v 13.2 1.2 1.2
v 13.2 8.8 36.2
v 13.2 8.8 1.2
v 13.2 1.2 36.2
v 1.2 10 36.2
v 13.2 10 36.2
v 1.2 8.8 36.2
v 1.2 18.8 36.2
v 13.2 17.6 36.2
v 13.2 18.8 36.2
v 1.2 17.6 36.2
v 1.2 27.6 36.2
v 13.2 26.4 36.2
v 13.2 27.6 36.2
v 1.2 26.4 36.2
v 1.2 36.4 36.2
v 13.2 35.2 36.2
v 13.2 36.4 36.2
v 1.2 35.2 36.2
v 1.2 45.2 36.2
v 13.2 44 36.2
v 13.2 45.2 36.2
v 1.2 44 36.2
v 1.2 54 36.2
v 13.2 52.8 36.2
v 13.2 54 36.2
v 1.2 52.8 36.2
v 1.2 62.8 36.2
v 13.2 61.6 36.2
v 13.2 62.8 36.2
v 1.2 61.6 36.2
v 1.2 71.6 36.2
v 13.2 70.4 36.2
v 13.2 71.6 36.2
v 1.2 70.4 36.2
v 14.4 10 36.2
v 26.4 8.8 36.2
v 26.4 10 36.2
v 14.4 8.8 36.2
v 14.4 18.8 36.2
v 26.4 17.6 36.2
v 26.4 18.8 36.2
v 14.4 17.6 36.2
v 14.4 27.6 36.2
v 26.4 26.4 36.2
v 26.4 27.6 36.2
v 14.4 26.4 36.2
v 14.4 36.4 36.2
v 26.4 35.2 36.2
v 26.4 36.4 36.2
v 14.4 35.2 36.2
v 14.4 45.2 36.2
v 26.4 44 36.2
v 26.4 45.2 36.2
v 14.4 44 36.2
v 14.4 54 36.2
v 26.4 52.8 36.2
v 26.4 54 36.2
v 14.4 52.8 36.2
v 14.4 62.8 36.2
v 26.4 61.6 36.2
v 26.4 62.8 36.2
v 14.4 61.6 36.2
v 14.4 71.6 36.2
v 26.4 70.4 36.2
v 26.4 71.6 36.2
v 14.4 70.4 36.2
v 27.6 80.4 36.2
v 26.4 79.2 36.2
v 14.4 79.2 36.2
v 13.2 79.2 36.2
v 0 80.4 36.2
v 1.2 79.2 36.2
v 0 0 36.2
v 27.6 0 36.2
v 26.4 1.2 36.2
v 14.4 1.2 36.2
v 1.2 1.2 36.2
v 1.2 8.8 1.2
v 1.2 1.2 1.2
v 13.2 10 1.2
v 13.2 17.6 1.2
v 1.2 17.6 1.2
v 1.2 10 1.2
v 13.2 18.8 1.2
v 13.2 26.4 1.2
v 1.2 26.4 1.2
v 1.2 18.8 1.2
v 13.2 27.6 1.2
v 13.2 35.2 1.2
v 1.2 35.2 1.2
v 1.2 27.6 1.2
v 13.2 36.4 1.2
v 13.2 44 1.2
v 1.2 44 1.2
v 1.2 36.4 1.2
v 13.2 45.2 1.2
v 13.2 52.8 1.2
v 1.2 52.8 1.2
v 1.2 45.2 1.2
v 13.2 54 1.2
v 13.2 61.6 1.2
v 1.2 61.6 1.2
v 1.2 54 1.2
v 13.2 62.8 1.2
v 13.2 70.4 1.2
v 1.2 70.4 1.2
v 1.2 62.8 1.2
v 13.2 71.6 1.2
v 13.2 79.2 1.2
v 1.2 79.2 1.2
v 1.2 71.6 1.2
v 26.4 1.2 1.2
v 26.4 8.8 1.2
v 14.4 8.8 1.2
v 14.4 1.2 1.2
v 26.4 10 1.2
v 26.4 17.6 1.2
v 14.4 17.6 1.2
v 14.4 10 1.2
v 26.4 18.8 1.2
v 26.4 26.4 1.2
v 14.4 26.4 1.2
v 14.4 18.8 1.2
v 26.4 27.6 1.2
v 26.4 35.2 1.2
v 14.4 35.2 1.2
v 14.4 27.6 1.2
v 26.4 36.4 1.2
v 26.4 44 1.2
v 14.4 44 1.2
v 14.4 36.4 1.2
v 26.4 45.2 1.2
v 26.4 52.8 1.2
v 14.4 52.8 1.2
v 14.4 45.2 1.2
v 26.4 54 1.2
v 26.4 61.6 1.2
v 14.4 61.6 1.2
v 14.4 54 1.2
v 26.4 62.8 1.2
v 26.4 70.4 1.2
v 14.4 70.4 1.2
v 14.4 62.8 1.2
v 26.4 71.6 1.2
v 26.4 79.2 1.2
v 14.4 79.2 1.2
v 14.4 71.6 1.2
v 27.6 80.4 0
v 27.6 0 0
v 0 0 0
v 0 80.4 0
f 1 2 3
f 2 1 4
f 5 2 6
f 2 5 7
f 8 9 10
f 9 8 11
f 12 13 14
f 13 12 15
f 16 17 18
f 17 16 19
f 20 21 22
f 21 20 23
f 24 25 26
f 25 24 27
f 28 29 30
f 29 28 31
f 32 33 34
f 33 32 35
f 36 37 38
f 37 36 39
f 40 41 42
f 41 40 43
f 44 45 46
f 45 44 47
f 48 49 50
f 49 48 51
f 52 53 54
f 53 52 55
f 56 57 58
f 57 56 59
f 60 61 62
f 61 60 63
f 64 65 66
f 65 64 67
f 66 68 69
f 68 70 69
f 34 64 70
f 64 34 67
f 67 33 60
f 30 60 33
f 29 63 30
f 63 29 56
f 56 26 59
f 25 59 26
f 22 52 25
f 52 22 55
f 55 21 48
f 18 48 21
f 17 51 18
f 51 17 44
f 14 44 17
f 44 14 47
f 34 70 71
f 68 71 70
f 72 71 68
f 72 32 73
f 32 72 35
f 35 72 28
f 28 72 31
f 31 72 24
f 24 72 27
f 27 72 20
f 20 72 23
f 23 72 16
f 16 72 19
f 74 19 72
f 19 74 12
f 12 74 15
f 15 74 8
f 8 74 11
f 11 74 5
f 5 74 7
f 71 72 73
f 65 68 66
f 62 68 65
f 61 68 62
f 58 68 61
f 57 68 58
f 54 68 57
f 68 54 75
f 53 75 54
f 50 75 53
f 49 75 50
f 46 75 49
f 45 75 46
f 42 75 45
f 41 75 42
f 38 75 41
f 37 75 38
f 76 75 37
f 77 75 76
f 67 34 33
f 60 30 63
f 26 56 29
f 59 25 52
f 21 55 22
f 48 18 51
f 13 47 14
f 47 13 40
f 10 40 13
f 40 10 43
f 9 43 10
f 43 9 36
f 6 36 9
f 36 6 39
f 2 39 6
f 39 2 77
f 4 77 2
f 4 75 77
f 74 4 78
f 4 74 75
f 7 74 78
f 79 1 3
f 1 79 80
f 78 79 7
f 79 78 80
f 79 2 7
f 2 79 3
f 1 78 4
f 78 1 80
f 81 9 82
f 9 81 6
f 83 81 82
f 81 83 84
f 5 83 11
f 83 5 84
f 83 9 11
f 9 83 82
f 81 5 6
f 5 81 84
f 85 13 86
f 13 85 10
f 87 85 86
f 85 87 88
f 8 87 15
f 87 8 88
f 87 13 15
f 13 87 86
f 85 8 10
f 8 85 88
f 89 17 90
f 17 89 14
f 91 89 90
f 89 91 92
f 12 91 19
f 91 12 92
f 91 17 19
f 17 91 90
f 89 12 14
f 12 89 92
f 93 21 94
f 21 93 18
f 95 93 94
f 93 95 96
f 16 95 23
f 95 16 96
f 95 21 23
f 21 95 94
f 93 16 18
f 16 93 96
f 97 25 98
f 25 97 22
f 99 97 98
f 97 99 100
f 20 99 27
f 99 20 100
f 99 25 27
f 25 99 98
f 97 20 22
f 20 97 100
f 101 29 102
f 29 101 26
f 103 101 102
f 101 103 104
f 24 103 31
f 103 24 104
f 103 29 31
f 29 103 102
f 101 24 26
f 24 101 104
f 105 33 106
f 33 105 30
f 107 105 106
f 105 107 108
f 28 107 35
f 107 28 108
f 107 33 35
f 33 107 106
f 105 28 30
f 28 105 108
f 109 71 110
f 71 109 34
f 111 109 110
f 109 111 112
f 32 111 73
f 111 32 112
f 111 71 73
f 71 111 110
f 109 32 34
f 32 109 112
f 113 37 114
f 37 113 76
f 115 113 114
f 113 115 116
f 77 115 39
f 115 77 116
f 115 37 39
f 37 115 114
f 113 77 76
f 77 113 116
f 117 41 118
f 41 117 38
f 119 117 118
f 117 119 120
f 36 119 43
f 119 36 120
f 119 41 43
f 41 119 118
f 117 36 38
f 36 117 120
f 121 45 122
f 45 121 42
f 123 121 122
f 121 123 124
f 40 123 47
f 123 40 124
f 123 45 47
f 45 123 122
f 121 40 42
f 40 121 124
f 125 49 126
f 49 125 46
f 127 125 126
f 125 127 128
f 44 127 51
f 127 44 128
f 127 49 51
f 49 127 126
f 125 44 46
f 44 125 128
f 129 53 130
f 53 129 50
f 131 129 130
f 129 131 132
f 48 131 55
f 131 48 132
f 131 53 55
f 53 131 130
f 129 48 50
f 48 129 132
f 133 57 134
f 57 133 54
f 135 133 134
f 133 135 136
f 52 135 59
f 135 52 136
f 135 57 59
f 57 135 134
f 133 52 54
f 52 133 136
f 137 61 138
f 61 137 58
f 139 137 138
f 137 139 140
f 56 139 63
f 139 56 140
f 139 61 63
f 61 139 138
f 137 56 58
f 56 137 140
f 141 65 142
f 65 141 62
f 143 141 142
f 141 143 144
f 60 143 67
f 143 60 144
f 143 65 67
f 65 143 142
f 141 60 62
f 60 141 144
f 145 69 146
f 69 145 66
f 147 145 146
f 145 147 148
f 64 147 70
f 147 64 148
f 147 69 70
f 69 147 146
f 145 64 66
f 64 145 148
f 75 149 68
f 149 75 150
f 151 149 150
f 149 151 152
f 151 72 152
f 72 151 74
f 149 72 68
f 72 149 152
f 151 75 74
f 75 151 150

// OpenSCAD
cols = 2;
rows = 9;

walls = 1.2;
bottom = 1.2;

width = 12;
depth = 7.6;

height = 35;

echo(rows* depth + (rows + 1) * depth);
difference() {
  cube([cols * width + (cols + 1) * walls, rows * depth + (rows + 1) * walls, height + bottom]);
  for (i = [0:cols - 1]) {
    for (j = [0:rows - 1]) {
      translate([i * width + walls * (i + 1), j * depth + walls * (j + 1), bottom]) {
        cube([width, depth, height]);
      }
    }
  }
}
